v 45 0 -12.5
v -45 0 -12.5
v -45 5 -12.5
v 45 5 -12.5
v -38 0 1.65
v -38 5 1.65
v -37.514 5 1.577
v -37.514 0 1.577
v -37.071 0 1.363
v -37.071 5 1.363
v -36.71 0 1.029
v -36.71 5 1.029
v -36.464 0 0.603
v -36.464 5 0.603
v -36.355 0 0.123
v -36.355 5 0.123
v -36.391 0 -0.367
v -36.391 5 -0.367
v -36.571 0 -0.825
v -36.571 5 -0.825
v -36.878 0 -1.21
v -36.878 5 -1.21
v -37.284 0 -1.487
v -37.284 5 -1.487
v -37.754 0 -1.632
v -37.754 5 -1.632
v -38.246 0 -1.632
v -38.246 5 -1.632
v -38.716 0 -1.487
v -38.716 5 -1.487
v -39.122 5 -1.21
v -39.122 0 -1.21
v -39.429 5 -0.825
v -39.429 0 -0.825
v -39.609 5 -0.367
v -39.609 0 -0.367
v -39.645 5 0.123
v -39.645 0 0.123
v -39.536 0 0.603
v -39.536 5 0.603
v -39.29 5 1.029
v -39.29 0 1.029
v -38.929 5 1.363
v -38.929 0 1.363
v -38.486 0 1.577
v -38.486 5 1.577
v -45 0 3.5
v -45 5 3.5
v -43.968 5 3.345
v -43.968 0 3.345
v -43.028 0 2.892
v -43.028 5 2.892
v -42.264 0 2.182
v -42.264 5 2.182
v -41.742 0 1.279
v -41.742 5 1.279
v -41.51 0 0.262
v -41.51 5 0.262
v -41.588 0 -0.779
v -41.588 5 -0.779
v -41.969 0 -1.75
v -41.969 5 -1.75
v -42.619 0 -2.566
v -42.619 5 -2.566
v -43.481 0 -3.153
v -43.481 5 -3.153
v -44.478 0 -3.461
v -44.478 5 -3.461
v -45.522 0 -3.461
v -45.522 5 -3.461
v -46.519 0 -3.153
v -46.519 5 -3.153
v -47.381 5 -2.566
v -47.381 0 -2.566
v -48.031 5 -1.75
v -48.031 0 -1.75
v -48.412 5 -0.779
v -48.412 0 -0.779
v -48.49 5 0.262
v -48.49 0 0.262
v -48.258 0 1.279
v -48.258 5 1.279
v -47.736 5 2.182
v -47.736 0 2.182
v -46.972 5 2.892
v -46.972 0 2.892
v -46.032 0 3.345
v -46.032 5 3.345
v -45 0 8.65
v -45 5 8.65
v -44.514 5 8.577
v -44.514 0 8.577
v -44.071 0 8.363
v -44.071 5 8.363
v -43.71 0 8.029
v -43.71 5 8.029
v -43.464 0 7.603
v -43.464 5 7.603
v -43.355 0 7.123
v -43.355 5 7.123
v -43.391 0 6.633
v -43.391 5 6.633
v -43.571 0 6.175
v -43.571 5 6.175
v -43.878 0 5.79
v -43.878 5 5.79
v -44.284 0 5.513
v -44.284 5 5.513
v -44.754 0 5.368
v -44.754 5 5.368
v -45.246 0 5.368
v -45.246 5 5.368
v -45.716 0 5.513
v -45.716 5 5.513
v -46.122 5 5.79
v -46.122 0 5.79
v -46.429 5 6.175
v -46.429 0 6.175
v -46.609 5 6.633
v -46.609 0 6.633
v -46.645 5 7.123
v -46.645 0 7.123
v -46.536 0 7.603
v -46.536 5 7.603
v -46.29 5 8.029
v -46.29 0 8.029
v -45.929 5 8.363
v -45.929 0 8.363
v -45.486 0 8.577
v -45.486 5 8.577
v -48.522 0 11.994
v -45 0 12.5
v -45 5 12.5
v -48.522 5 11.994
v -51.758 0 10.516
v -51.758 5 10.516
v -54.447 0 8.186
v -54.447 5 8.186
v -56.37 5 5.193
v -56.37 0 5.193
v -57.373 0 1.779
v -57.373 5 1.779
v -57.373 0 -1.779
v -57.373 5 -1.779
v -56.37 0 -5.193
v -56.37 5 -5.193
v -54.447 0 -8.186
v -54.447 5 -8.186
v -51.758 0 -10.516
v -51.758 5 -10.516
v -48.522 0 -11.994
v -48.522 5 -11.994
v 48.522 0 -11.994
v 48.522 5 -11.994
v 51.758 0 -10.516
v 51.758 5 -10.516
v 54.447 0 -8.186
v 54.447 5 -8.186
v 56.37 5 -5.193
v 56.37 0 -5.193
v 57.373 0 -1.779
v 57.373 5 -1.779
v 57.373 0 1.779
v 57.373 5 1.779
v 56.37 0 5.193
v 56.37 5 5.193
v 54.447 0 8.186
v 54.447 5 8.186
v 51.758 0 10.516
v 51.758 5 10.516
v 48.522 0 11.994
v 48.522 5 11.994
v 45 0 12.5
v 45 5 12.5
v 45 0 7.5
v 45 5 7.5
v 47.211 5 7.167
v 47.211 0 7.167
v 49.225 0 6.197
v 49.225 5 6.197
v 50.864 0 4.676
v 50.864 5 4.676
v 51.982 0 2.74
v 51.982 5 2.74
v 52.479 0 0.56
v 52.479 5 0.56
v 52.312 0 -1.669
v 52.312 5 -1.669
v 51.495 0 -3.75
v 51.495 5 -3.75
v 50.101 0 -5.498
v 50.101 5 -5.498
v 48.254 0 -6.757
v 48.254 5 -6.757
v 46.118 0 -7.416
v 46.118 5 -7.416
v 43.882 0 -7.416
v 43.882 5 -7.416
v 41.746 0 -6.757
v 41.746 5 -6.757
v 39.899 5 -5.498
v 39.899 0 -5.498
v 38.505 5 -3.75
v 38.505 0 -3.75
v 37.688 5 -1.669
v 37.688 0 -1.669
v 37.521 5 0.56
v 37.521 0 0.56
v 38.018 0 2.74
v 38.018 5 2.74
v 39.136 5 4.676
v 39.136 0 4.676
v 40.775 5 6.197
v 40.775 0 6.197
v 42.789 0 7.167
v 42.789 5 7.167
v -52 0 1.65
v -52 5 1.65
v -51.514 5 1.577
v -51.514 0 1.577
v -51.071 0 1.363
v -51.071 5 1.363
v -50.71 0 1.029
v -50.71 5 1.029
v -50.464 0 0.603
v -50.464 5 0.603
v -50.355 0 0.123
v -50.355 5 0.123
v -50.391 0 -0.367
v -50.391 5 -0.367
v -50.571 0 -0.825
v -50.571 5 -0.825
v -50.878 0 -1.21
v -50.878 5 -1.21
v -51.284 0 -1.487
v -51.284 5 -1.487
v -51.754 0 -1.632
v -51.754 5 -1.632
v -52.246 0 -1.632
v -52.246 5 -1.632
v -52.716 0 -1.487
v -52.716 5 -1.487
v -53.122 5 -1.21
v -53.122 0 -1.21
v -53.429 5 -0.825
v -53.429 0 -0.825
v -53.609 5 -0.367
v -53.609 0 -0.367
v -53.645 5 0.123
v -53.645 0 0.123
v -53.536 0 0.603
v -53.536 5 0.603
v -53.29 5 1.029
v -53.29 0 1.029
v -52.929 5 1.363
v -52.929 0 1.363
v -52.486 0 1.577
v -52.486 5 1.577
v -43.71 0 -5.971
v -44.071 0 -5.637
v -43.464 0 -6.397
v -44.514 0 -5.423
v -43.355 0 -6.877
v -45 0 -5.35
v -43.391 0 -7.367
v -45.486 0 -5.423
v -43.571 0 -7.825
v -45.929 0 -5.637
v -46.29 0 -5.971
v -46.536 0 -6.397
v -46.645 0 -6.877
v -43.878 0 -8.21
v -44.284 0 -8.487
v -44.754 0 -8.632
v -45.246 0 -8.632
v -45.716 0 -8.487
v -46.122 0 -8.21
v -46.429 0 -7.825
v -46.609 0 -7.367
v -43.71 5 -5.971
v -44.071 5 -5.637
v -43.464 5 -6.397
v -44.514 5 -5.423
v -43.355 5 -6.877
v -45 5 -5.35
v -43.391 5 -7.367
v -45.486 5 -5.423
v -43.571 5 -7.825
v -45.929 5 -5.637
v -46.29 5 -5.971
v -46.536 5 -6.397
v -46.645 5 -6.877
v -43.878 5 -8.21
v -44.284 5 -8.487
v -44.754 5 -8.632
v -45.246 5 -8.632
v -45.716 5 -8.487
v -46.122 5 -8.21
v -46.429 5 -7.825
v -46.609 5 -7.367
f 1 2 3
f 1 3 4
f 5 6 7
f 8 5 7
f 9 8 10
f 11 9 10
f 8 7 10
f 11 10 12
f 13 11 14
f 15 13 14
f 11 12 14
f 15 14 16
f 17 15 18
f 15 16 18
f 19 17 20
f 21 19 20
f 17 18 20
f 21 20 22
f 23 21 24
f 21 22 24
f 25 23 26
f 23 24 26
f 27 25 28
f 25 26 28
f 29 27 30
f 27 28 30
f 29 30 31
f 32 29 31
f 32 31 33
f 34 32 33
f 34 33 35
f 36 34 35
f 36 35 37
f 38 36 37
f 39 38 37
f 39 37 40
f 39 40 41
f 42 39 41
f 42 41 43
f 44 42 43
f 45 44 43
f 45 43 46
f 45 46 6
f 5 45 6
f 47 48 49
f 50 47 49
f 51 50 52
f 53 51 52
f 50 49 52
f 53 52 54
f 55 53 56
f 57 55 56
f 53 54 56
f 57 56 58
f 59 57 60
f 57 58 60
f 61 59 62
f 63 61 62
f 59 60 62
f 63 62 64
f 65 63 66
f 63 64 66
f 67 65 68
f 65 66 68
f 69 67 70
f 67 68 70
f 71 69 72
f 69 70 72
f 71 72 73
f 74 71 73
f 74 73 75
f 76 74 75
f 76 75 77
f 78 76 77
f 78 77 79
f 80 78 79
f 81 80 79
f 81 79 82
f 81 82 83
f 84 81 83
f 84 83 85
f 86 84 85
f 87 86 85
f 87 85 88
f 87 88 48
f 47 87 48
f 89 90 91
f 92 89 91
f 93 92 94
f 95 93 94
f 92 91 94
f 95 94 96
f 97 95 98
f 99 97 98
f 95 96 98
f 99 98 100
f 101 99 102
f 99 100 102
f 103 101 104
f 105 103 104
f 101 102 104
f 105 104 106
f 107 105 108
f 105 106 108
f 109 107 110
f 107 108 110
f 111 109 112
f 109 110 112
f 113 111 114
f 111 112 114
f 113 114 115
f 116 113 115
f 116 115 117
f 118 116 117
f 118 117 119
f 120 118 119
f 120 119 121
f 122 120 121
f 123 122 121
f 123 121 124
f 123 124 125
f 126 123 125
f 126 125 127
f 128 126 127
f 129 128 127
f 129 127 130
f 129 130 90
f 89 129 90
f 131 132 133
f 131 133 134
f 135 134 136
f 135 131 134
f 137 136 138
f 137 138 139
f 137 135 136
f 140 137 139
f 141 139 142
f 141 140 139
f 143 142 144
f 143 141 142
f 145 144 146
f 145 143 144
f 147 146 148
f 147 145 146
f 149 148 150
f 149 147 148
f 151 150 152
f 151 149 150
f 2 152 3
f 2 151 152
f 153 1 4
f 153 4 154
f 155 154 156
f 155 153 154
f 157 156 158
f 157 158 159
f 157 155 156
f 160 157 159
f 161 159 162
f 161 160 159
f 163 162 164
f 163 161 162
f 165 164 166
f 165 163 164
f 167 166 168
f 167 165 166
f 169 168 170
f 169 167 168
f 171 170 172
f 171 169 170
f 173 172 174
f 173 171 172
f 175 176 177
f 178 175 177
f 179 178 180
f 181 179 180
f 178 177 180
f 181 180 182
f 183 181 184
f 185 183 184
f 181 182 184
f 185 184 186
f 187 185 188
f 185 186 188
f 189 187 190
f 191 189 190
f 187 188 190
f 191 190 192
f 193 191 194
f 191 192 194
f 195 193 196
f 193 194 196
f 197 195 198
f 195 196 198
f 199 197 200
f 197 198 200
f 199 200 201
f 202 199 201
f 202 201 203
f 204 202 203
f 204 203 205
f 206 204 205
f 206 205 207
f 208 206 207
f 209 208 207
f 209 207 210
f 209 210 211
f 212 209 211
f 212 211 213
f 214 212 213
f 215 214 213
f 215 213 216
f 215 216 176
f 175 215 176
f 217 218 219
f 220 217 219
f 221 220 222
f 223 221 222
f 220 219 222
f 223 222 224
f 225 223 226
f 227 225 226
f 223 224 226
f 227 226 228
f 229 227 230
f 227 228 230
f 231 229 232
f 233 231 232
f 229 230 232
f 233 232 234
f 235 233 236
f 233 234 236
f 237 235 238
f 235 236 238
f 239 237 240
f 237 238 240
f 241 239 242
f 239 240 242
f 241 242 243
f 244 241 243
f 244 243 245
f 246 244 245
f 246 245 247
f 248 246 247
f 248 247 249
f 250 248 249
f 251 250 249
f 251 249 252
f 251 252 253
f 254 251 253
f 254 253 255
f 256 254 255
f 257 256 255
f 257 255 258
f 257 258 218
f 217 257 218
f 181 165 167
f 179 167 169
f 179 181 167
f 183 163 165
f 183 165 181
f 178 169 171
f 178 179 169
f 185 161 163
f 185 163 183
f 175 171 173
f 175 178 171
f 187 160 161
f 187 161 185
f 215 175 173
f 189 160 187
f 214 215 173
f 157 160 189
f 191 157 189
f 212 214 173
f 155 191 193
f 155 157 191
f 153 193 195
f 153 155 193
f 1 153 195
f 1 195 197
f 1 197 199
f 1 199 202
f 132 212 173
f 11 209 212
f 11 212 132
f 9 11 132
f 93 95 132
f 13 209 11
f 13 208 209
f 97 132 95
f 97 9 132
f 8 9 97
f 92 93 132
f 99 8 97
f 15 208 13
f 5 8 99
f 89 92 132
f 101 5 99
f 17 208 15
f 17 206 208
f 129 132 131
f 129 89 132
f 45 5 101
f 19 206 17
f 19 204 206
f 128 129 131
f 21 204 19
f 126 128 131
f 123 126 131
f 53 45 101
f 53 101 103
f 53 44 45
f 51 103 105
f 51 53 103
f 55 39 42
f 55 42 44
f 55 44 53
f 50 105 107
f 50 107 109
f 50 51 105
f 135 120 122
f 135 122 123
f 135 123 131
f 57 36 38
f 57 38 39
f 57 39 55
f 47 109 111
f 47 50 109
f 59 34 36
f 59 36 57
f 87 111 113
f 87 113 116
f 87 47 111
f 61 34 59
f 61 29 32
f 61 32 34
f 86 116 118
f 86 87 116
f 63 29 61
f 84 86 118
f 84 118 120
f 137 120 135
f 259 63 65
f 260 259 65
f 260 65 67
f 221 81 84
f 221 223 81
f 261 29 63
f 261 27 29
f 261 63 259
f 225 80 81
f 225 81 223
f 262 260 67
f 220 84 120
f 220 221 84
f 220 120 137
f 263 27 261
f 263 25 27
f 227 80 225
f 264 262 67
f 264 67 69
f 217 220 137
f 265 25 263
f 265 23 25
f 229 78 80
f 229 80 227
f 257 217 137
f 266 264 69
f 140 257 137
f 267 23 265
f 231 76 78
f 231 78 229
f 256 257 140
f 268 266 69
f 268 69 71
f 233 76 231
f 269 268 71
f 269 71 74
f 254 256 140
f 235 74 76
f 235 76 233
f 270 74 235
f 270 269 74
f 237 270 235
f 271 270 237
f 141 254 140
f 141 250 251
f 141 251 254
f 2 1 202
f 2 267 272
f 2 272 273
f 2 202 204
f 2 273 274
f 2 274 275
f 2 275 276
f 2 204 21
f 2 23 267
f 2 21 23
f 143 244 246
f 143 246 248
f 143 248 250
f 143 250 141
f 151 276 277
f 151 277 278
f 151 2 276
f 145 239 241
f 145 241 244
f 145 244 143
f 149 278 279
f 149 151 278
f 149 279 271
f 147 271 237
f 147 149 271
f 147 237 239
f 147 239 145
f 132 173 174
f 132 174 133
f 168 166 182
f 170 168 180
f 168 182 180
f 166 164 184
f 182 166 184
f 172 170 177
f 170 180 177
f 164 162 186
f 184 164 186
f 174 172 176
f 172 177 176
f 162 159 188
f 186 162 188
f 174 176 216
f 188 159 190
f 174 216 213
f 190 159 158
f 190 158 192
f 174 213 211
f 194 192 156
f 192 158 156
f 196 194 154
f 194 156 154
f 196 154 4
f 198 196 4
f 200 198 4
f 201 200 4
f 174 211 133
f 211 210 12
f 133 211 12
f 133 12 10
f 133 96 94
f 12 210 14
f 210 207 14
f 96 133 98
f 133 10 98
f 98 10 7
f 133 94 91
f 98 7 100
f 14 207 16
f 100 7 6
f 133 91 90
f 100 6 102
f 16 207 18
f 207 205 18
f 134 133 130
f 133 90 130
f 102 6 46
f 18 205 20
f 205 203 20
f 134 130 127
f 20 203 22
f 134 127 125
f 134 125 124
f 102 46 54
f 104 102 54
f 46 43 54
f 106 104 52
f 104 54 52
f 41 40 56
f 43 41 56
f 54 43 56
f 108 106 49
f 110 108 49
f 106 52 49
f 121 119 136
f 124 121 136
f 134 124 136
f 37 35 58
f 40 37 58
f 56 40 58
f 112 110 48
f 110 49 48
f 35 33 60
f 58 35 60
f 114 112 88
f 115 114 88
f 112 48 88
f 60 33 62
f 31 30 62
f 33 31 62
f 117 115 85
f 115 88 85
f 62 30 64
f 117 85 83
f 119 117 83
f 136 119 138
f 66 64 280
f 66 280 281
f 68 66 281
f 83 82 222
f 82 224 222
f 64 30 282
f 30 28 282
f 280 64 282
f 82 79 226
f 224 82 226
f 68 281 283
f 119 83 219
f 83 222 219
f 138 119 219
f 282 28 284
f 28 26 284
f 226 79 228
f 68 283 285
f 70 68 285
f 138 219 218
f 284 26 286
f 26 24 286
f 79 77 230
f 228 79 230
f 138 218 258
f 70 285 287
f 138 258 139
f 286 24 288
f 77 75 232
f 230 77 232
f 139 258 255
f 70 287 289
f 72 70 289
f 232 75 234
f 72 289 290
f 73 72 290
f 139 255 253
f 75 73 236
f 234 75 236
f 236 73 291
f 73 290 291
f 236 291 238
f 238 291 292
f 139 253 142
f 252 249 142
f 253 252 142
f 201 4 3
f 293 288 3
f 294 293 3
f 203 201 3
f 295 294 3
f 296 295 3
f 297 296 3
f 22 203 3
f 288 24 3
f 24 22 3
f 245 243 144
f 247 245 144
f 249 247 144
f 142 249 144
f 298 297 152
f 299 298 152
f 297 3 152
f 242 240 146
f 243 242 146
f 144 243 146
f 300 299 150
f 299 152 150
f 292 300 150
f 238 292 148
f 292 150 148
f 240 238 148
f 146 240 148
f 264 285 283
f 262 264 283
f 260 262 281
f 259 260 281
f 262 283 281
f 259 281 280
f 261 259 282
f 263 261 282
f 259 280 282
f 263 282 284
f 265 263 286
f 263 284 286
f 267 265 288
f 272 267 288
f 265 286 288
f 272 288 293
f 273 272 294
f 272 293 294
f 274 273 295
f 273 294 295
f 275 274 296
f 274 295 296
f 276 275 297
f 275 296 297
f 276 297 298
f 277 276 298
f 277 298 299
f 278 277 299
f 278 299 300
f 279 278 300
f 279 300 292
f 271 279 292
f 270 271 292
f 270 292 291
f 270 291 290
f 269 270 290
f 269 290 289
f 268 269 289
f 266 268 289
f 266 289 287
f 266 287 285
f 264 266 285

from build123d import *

# Parameters (mm, degrees)
EXTRUDE_1_DEPTH     = 5
CUT_EXTRUDE_1_REACH = 61.055
SKETCH_2_R          = 3.5
SKETCH_2_R_2        = 7.5
SKETCH_2_R_3        = 1.65


with BuildPart() as part:
    # 草图1 → 凸台-拉伸1 (new body)
    with BuildSketch(Plane(origin=(0, 0, 0), x_dir=(1, 0, 0), z_dir=(0, 1, 0))):
        with BuildLine():
            Line((45, -12.5), (-45, -12.5))
            ThreePointArc((-45, -12.5), (-57.5, 0), (-45, 12.5))
            Line((-45, 12.5), (45, 12.5))
            ThreePointArc((45, 12.5), (57.5, 0), (45, -12.5))
        make_face()
    extrude(amount=EXTRUDE_1_DEPTH)

    # 草图2 → 切除-拉伸1 (cut, up to next)
    with BuildSketch(Plane(origin=(0, 5, 0), x_dir=(1, 0, 0), z_dir=(0, 1, 0)), mode=Mode.PRIVATE) as cut_extrude_1_sk1:
        with Locations(Location((-45, 0, 0), (0, 0, 270))):
            Circle(SKETCH_2_R)
    cut_extrude_1_tool1 = extrude(cut_extrude_1_sk1.sketch, amount=-CUT_EXTRUDE_1_REACH, mode=Mode.PRIVATE) & part.part
    # 草图2 → 切除-拉伸1 (cut, up to next)
    with BuildSketch(Plane(origin=(0, 5, 0), x_dir=(1, 0, 0), z_dir=(0, 1, 0)), mode=Mode.PRIVATE) as cut_extrude_1_sk2:
        with Locations(Location((45, 0, 0), (0, 0, 270))):
            Circle(SKETCH_2_R_2)
    cut_extrude_1_tool2 = extrude(cut_extrude_1_sk2.sketch, amount=-CUT_EXTRUDE_1_REACH, mode=Mode.PRIVATE) & part.part
    # 草图2 → 切除-拉伸1 (cut, up to next)
    with BuildSketch(Plane(origin=(0, 5, 0), x_dir=(1, 0, 0), z_dir=(0, 1, 0)), mode=Mode.PRIVATE) as cut_extrude_1_sk3:
        with Locations(Location((-45, 7, 0), (0, 0, 270))):
            Circle(SKETCH_2_R_3)
    cut_extrude_1_tool3 = extrude(cut_extrude_1_sk3.sketch, amount=-CUT_EXTRUDE_1_REACH, mode=Mode.PRIVATE) & part.part
    # 草图2 → 切除-拉伸1 (cut, up to next)
    with BuildSketch(Plane(origin=(0, 5, 0), x_dir=(1, 0, 0), z_dir=(0, 1, 0)), mode=Mode.PRIVATE) as cut_extrude_1_sk4:
        with Locations(Location((-38, 0, 0), (0, 0, 270))):
            Circle(SKETCH_2_R_3)
    cut_extrude_1_tool4 = extrude(cut_extrude_1_sk4.sketch, amount=-CUT_EXTRUDE_1_REACH, mode=Mode.PRIVATE) & part.part
    # 草图2 → 切除-拉伸1 (cut, up to next)
    with BuildSketch(Plane(origin=(0, 5, 0), x_dir=(1, 0, 0), z_dir=(0, 1, 0)), mode=Mode.PRIVATE) as cut_extrude_1_sk5:
        with Locations(Location((-45, -7, 0), (0, 0, 270))):
            Circle(SKETCH_2_R_3)
    cut_extrude_1_tool5 = extrude(cut_extrude_1_sk5.sketch, amount=-CUT_EXTRUDE_1_REACH, mode=Mode.PRIVATE) & part.part
    # 草图2 → 切除-拉伸1 (cut, up to next)
    with BuildSketch(Plane(origin=(0, 5, 0), x_dir=(1, 0, 0), z_dir=(0, 1, 0)), mode=Mode.PRIVATE) as cut_extrude_1_sk6:
        with Locations(Location((-52, 0, 0), (0, 0, 270))):
            Circle(SKETCH_2_R_3)
    cut_extrude_1_tool6 = extrude(cut_extrude_1_sk6.sketch, amount=-CUT_EXTRUDE_1_REACH, mode=Mode.PRIVATE) & part.part
    add(cut_extrude_1_tool1.solids().sort_by_distance((-45, 5, 0))[0], mode=Mode.SUBTRACT)
    add(cut_extrude_1_tool2.solids().sort_by_distance((45, 5, 0))[0], mode=Mode.SUBTRACT)
    add(cut_extrude_1_tool3.solids().sort_by_distance((-45, 5, -7))[0], mode=Mode.SUBTRACT)
    add(cut_extrude_1_tool4.solids().sort_by_distance((-38, 5, 0))[0], mode=Mode.SUBTRACT)
    add(cut_extrude_1_tool5.solids().sort_by_distance((-45, 5, 7))[0], mode=Mode.SUBTRACT)
    add(cut_extrude_1_tool6.solids().sort_by_distance((-52, 5, 0))[0], mode=Mode.SUBTRACT)


solid = part.part
